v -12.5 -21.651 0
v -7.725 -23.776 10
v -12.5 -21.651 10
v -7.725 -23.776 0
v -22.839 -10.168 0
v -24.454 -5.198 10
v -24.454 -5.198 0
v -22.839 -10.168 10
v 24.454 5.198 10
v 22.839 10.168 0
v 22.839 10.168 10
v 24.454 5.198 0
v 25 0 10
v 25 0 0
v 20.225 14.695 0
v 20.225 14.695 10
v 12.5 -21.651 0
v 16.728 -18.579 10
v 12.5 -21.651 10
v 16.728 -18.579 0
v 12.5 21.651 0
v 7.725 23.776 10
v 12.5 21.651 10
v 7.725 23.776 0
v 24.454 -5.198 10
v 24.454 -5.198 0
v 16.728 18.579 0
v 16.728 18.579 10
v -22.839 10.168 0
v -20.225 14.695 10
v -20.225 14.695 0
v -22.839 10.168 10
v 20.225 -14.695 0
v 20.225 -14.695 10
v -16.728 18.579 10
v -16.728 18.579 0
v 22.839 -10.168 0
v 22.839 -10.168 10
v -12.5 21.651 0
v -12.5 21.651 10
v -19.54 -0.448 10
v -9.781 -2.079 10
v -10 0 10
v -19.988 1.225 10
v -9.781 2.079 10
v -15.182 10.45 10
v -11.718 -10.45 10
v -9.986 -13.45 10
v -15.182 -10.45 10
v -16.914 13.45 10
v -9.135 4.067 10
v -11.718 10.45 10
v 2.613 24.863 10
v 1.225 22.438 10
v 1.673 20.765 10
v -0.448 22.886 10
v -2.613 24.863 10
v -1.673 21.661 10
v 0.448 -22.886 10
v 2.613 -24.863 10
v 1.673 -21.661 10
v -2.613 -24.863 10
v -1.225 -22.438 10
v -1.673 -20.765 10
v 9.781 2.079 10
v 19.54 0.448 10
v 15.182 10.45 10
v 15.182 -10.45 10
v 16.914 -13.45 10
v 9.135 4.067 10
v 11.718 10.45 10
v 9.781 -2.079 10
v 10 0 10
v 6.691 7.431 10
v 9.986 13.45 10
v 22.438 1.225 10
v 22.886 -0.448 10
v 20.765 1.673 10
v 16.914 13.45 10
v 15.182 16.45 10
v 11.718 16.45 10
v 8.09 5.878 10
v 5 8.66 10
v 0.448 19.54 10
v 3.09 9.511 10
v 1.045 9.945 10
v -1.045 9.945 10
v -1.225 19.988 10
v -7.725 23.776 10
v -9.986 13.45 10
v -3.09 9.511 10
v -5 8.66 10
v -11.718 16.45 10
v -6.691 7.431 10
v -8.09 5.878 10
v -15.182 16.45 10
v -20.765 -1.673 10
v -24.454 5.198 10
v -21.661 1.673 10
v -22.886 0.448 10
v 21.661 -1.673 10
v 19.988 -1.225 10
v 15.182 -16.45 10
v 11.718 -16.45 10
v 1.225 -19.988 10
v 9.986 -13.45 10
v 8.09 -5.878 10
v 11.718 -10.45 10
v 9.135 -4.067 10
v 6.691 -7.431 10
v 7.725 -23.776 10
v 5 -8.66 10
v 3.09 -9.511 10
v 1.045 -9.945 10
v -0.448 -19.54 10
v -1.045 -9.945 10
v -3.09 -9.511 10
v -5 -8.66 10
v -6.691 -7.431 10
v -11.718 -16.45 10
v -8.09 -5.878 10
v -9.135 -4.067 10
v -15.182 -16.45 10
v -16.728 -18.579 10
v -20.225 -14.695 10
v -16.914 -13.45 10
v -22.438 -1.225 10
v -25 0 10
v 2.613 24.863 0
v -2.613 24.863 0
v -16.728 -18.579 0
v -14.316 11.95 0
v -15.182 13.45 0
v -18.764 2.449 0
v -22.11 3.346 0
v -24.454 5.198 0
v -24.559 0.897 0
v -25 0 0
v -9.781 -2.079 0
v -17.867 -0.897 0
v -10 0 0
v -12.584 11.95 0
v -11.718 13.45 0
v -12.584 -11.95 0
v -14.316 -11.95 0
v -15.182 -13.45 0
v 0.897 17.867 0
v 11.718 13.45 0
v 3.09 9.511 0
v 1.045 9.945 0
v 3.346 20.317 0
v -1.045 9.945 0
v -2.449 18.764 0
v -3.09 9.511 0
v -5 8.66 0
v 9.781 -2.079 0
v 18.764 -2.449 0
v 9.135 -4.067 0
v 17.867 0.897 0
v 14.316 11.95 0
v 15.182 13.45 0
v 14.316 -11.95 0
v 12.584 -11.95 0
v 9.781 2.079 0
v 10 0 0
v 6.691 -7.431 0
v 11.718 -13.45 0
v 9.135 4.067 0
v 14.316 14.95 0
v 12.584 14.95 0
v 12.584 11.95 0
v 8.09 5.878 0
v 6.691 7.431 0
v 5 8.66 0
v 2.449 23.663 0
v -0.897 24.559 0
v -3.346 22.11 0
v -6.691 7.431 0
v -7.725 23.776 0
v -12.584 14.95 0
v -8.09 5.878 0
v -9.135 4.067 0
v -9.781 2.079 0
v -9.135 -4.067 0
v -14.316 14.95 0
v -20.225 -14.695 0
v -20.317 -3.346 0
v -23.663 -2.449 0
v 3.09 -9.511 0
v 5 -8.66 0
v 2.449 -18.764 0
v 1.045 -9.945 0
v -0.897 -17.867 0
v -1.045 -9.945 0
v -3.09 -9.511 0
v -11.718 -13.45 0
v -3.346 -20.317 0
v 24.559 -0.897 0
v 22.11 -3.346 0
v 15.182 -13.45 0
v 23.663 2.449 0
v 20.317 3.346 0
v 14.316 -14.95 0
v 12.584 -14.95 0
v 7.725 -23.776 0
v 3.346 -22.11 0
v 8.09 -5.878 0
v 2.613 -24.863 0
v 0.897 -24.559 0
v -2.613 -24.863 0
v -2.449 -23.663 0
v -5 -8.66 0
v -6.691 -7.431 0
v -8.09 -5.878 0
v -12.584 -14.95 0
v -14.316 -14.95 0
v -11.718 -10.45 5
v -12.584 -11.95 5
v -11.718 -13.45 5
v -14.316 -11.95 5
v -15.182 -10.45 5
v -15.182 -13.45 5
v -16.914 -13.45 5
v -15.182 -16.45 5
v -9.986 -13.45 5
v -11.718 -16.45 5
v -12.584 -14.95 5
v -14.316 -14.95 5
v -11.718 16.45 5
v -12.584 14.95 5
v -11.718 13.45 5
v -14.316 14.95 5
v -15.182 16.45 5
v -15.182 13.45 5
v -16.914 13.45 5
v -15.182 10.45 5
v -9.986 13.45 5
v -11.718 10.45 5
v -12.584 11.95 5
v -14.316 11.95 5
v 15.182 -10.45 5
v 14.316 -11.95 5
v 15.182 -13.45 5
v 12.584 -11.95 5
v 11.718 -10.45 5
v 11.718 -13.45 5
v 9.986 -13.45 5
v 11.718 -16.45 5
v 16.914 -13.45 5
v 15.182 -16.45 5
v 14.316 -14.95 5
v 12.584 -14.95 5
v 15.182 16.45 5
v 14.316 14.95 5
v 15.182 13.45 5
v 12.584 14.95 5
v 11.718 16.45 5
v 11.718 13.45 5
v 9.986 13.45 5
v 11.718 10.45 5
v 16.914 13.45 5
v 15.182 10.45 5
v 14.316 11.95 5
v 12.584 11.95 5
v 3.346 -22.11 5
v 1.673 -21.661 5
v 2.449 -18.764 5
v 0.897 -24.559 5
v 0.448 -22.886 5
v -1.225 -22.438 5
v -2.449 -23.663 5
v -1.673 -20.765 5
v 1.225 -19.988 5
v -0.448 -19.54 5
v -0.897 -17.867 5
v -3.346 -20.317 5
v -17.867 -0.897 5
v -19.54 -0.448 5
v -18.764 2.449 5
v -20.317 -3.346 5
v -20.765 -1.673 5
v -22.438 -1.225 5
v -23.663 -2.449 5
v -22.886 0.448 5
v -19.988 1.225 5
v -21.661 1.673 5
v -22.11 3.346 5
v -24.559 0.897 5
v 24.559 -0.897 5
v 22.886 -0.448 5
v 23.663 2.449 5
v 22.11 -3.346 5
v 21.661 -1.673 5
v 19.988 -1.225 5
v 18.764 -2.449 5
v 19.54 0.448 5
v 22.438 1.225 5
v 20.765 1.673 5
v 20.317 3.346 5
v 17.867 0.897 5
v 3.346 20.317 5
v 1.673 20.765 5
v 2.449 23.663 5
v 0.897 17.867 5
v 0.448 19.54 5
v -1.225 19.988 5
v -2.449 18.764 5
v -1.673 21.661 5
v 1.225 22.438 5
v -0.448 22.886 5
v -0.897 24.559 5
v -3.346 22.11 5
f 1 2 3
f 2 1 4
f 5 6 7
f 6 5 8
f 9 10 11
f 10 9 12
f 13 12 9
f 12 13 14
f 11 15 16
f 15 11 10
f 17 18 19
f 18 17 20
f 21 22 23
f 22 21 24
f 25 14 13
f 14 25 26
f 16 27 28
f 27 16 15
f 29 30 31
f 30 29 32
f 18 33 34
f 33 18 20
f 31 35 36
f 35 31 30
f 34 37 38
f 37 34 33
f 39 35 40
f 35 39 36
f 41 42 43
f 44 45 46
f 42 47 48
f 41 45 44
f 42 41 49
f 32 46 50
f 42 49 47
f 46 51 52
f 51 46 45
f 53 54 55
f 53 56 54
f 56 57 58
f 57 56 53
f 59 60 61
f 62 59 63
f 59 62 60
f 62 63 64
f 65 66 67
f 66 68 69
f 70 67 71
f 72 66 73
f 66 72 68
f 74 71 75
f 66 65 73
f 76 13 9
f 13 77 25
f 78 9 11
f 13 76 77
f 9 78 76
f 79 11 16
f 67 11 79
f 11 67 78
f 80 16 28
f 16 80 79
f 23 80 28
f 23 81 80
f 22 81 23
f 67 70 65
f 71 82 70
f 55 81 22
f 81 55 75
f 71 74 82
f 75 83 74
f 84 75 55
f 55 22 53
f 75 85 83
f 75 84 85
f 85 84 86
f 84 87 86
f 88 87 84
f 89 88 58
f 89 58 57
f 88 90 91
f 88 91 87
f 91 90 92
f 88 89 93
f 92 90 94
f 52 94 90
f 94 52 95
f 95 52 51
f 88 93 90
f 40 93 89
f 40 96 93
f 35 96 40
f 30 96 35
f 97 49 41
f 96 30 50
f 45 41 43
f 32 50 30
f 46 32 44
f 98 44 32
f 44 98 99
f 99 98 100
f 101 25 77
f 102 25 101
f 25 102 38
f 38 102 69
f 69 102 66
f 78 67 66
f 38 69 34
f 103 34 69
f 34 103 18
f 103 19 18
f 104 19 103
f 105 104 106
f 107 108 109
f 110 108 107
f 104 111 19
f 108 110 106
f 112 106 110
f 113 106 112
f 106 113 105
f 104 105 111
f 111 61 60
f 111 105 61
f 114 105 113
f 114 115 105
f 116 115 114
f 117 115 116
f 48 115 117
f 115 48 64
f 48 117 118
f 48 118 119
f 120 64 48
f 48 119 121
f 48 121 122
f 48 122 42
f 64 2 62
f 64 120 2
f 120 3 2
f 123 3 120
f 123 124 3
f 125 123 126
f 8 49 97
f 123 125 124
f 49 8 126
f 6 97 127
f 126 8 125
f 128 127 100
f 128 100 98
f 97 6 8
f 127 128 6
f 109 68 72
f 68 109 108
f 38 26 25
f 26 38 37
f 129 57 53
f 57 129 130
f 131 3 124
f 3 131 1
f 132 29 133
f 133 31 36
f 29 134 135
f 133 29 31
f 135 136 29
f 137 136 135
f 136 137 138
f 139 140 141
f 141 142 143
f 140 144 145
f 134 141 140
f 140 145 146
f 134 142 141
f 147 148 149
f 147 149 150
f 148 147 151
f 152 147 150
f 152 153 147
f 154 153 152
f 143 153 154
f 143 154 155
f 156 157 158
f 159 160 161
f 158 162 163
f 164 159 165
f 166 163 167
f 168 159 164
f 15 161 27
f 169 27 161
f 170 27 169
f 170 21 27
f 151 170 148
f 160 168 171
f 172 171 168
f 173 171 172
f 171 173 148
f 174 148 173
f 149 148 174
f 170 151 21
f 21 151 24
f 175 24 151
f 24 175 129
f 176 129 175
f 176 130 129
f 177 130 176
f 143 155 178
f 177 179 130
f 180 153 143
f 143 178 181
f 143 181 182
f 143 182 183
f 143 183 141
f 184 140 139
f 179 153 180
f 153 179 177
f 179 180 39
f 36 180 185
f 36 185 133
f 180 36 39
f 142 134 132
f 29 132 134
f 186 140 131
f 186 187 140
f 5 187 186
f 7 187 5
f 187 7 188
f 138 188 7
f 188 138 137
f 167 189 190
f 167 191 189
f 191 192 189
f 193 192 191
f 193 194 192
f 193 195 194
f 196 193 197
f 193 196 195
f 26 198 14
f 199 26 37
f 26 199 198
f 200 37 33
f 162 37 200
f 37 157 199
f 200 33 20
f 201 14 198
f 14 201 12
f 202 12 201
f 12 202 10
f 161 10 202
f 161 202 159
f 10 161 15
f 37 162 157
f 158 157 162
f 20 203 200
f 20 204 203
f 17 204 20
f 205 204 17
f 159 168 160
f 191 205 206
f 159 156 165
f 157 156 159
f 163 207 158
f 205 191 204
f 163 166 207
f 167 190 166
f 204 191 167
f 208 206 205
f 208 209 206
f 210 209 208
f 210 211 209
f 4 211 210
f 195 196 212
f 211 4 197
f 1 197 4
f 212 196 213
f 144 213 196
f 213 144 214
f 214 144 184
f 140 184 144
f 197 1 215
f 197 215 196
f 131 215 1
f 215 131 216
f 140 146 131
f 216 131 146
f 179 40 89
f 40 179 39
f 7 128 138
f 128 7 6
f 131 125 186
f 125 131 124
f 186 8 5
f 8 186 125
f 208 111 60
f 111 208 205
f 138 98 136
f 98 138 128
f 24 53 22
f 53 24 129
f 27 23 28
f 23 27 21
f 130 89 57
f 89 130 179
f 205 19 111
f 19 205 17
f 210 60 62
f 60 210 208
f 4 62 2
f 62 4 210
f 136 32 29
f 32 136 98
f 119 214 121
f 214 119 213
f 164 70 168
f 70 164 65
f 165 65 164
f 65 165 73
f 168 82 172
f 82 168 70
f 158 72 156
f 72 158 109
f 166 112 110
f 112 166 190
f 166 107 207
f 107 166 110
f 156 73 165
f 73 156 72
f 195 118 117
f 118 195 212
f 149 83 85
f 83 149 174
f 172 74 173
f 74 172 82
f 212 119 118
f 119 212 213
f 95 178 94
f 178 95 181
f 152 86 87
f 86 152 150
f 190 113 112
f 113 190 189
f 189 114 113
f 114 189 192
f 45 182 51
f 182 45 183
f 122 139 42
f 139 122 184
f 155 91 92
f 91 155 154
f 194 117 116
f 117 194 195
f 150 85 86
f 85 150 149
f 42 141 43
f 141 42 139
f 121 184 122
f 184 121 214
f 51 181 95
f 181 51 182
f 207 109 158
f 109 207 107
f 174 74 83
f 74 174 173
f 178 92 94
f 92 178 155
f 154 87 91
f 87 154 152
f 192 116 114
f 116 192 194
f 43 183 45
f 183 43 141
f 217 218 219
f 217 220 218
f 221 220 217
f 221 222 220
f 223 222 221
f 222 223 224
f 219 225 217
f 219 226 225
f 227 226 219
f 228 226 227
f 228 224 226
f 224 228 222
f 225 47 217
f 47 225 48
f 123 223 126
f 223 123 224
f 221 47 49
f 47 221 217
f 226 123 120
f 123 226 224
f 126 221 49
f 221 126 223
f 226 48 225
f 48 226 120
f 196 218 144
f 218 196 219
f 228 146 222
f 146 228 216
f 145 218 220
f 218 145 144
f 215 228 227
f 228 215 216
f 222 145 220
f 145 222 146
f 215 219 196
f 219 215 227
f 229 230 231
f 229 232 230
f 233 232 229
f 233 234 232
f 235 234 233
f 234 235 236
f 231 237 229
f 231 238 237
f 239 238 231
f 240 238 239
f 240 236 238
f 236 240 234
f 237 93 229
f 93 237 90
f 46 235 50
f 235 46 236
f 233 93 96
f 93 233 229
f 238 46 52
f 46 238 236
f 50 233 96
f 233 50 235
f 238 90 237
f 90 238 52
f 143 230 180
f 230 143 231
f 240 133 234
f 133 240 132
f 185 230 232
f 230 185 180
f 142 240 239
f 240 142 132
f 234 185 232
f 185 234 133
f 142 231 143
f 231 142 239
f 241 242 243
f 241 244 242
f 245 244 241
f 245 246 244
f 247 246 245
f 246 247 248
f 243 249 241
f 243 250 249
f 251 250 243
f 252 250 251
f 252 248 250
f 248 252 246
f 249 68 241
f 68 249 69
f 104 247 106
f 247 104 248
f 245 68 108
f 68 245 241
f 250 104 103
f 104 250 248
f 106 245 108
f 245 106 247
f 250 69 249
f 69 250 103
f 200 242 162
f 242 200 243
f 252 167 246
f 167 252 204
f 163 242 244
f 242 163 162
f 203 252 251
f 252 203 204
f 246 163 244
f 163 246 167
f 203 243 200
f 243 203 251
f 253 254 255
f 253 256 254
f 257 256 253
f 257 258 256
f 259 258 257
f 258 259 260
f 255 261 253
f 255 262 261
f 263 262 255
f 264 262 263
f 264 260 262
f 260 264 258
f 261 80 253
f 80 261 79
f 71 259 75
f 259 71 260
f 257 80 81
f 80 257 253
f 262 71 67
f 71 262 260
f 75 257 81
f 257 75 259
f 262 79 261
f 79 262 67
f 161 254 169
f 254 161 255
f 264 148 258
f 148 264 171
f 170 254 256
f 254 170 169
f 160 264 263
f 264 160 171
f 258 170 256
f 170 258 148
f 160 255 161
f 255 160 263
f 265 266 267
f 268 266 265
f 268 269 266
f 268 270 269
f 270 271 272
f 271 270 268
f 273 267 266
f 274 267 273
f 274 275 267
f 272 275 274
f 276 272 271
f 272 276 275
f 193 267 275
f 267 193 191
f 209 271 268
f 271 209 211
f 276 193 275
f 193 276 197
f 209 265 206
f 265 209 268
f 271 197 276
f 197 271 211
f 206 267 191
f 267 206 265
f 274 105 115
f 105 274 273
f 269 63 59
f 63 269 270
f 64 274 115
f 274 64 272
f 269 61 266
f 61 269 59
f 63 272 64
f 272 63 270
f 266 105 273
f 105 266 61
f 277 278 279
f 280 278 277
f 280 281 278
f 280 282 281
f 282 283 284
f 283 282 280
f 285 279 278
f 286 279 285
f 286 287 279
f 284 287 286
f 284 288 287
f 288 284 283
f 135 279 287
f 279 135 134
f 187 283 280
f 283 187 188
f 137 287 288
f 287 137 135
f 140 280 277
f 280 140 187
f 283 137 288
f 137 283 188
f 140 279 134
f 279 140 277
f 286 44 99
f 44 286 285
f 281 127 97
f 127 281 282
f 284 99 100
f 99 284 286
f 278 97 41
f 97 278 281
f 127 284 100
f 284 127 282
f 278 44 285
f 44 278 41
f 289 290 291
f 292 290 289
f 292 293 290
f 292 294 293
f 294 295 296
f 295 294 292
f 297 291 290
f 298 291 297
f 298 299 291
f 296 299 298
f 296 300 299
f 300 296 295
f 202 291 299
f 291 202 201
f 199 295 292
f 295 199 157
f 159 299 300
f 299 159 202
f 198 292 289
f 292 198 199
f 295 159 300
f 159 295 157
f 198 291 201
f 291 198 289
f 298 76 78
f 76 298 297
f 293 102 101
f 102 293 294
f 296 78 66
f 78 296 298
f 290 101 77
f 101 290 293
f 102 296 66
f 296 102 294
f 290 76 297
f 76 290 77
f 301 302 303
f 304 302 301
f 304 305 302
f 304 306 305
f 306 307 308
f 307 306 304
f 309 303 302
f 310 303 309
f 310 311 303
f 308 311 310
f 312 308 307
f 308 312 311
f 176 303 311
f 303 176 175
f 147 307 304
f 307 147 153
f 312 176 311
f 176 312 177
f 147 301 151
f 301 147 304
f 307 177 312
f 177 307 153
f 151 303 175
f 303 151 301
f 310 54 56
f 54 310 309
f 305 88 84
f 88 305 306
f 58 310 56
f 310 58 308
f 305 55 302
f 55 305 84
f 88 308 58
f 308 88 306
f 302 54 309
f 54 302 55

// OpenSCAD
/*
 This creates a size a to size b ring adapter for interoperation of cage parts of different sizes or from different manufacturers
 Counterbores are assumed to be for M3 or 4-40 screws and Rod A counterbores will be easier to print (Rod B counterbores may need supports)
  */

Plate_Thickness = 10;

Outer_Diameter = 50;

//(0 = no thru hole)
Inner_Diameter = 20;

Rod_A_Diameter = 6;

Rod_A_Spacing = 26.9;

Rod_A_Hole_Type = "Counterbore";	//	[Thru, Counterbore]

Rod_B_Diameter = 6;

Rod_B_Spacing = 30;

Rod_B_Hole_Type = "Counterbore";	//	[Thru, Counterbore]

Relative_Angle= 45;//	[0:90]
difference(){
    make_plate ();
    make_rod_a_hole();
    make_rod_b_hole();
}

module make_plate (){
    if (Inner_Diameter == 0) cylinder(h = Plate_Thickness, r = Outer_Diameter/2, Center = false);
    else difference(){
        cylinder(h = Plate_Thickness, r = Outer_Diameter/2, Center = false);
        cylinder(h = Plate_Thickness, r = Inner_Diameter/2, Center = false);
    }
}
module make_rod_a_hole (){
    if (Rod_A_Hole_Type == "Thru")
    { 
        for (x = [-.5,.5], 
        y =[-.5,.5]) translate ([x*Rod_A_Spacing,y*Rod_A_Spacing,Plate_Thickness/2]) make_hex(Rod_A_Diameter,Plate_Thickness);
    }
    else
    { 
        for (x = [-.5,.5], 
        y =[-.5,.5]) translate ([x*Rod_A_Spacing,y*Rod_A_Spacing,Plate_Thickness/4]) make_counter(Rod_A_Diameter,Plate_Thickness);
    }
    
}
module make_rod_b_hole (){
    if (Rod_B_Hole_Type == "Thru")
    { 
        for (x = [-.5,.5], 
        y =[-.5,.5]) rotate([0,0,Relative_Angle]) translate ([x*Rod_B_Spacing,y*Rod_B_Spacing,Plate_Thickness/2]) make_hex(Rod_B_Diameter,Plate_Thickness);
    }
    else
    { 
        for (x = [-.5,.5], 
        y =[-.5,.5]) rotate([0,0,Relative_Angle])translate ([x*Rod_B_Spacing,y*Rod_B_Spacing,3*Plate_Thickness/4])mirror([0,0,1]) make_counter(Rod_B_Diameter,Plate_Thickness);
    }
    
}
module make_hex(Diam,Len){
    s =Diam/2 * ( 2 * tan(30));
        for (r = [-60,0,60]) rotate([0,0,r]) cube([s, Diam, Len], true);
            }
module make_counter(Diam,Len){
            union(){
            translate ([0,0,Len/2]) make_hex(Diam,Len/2);
            make_hex(3,Len/2);
        }
    }
